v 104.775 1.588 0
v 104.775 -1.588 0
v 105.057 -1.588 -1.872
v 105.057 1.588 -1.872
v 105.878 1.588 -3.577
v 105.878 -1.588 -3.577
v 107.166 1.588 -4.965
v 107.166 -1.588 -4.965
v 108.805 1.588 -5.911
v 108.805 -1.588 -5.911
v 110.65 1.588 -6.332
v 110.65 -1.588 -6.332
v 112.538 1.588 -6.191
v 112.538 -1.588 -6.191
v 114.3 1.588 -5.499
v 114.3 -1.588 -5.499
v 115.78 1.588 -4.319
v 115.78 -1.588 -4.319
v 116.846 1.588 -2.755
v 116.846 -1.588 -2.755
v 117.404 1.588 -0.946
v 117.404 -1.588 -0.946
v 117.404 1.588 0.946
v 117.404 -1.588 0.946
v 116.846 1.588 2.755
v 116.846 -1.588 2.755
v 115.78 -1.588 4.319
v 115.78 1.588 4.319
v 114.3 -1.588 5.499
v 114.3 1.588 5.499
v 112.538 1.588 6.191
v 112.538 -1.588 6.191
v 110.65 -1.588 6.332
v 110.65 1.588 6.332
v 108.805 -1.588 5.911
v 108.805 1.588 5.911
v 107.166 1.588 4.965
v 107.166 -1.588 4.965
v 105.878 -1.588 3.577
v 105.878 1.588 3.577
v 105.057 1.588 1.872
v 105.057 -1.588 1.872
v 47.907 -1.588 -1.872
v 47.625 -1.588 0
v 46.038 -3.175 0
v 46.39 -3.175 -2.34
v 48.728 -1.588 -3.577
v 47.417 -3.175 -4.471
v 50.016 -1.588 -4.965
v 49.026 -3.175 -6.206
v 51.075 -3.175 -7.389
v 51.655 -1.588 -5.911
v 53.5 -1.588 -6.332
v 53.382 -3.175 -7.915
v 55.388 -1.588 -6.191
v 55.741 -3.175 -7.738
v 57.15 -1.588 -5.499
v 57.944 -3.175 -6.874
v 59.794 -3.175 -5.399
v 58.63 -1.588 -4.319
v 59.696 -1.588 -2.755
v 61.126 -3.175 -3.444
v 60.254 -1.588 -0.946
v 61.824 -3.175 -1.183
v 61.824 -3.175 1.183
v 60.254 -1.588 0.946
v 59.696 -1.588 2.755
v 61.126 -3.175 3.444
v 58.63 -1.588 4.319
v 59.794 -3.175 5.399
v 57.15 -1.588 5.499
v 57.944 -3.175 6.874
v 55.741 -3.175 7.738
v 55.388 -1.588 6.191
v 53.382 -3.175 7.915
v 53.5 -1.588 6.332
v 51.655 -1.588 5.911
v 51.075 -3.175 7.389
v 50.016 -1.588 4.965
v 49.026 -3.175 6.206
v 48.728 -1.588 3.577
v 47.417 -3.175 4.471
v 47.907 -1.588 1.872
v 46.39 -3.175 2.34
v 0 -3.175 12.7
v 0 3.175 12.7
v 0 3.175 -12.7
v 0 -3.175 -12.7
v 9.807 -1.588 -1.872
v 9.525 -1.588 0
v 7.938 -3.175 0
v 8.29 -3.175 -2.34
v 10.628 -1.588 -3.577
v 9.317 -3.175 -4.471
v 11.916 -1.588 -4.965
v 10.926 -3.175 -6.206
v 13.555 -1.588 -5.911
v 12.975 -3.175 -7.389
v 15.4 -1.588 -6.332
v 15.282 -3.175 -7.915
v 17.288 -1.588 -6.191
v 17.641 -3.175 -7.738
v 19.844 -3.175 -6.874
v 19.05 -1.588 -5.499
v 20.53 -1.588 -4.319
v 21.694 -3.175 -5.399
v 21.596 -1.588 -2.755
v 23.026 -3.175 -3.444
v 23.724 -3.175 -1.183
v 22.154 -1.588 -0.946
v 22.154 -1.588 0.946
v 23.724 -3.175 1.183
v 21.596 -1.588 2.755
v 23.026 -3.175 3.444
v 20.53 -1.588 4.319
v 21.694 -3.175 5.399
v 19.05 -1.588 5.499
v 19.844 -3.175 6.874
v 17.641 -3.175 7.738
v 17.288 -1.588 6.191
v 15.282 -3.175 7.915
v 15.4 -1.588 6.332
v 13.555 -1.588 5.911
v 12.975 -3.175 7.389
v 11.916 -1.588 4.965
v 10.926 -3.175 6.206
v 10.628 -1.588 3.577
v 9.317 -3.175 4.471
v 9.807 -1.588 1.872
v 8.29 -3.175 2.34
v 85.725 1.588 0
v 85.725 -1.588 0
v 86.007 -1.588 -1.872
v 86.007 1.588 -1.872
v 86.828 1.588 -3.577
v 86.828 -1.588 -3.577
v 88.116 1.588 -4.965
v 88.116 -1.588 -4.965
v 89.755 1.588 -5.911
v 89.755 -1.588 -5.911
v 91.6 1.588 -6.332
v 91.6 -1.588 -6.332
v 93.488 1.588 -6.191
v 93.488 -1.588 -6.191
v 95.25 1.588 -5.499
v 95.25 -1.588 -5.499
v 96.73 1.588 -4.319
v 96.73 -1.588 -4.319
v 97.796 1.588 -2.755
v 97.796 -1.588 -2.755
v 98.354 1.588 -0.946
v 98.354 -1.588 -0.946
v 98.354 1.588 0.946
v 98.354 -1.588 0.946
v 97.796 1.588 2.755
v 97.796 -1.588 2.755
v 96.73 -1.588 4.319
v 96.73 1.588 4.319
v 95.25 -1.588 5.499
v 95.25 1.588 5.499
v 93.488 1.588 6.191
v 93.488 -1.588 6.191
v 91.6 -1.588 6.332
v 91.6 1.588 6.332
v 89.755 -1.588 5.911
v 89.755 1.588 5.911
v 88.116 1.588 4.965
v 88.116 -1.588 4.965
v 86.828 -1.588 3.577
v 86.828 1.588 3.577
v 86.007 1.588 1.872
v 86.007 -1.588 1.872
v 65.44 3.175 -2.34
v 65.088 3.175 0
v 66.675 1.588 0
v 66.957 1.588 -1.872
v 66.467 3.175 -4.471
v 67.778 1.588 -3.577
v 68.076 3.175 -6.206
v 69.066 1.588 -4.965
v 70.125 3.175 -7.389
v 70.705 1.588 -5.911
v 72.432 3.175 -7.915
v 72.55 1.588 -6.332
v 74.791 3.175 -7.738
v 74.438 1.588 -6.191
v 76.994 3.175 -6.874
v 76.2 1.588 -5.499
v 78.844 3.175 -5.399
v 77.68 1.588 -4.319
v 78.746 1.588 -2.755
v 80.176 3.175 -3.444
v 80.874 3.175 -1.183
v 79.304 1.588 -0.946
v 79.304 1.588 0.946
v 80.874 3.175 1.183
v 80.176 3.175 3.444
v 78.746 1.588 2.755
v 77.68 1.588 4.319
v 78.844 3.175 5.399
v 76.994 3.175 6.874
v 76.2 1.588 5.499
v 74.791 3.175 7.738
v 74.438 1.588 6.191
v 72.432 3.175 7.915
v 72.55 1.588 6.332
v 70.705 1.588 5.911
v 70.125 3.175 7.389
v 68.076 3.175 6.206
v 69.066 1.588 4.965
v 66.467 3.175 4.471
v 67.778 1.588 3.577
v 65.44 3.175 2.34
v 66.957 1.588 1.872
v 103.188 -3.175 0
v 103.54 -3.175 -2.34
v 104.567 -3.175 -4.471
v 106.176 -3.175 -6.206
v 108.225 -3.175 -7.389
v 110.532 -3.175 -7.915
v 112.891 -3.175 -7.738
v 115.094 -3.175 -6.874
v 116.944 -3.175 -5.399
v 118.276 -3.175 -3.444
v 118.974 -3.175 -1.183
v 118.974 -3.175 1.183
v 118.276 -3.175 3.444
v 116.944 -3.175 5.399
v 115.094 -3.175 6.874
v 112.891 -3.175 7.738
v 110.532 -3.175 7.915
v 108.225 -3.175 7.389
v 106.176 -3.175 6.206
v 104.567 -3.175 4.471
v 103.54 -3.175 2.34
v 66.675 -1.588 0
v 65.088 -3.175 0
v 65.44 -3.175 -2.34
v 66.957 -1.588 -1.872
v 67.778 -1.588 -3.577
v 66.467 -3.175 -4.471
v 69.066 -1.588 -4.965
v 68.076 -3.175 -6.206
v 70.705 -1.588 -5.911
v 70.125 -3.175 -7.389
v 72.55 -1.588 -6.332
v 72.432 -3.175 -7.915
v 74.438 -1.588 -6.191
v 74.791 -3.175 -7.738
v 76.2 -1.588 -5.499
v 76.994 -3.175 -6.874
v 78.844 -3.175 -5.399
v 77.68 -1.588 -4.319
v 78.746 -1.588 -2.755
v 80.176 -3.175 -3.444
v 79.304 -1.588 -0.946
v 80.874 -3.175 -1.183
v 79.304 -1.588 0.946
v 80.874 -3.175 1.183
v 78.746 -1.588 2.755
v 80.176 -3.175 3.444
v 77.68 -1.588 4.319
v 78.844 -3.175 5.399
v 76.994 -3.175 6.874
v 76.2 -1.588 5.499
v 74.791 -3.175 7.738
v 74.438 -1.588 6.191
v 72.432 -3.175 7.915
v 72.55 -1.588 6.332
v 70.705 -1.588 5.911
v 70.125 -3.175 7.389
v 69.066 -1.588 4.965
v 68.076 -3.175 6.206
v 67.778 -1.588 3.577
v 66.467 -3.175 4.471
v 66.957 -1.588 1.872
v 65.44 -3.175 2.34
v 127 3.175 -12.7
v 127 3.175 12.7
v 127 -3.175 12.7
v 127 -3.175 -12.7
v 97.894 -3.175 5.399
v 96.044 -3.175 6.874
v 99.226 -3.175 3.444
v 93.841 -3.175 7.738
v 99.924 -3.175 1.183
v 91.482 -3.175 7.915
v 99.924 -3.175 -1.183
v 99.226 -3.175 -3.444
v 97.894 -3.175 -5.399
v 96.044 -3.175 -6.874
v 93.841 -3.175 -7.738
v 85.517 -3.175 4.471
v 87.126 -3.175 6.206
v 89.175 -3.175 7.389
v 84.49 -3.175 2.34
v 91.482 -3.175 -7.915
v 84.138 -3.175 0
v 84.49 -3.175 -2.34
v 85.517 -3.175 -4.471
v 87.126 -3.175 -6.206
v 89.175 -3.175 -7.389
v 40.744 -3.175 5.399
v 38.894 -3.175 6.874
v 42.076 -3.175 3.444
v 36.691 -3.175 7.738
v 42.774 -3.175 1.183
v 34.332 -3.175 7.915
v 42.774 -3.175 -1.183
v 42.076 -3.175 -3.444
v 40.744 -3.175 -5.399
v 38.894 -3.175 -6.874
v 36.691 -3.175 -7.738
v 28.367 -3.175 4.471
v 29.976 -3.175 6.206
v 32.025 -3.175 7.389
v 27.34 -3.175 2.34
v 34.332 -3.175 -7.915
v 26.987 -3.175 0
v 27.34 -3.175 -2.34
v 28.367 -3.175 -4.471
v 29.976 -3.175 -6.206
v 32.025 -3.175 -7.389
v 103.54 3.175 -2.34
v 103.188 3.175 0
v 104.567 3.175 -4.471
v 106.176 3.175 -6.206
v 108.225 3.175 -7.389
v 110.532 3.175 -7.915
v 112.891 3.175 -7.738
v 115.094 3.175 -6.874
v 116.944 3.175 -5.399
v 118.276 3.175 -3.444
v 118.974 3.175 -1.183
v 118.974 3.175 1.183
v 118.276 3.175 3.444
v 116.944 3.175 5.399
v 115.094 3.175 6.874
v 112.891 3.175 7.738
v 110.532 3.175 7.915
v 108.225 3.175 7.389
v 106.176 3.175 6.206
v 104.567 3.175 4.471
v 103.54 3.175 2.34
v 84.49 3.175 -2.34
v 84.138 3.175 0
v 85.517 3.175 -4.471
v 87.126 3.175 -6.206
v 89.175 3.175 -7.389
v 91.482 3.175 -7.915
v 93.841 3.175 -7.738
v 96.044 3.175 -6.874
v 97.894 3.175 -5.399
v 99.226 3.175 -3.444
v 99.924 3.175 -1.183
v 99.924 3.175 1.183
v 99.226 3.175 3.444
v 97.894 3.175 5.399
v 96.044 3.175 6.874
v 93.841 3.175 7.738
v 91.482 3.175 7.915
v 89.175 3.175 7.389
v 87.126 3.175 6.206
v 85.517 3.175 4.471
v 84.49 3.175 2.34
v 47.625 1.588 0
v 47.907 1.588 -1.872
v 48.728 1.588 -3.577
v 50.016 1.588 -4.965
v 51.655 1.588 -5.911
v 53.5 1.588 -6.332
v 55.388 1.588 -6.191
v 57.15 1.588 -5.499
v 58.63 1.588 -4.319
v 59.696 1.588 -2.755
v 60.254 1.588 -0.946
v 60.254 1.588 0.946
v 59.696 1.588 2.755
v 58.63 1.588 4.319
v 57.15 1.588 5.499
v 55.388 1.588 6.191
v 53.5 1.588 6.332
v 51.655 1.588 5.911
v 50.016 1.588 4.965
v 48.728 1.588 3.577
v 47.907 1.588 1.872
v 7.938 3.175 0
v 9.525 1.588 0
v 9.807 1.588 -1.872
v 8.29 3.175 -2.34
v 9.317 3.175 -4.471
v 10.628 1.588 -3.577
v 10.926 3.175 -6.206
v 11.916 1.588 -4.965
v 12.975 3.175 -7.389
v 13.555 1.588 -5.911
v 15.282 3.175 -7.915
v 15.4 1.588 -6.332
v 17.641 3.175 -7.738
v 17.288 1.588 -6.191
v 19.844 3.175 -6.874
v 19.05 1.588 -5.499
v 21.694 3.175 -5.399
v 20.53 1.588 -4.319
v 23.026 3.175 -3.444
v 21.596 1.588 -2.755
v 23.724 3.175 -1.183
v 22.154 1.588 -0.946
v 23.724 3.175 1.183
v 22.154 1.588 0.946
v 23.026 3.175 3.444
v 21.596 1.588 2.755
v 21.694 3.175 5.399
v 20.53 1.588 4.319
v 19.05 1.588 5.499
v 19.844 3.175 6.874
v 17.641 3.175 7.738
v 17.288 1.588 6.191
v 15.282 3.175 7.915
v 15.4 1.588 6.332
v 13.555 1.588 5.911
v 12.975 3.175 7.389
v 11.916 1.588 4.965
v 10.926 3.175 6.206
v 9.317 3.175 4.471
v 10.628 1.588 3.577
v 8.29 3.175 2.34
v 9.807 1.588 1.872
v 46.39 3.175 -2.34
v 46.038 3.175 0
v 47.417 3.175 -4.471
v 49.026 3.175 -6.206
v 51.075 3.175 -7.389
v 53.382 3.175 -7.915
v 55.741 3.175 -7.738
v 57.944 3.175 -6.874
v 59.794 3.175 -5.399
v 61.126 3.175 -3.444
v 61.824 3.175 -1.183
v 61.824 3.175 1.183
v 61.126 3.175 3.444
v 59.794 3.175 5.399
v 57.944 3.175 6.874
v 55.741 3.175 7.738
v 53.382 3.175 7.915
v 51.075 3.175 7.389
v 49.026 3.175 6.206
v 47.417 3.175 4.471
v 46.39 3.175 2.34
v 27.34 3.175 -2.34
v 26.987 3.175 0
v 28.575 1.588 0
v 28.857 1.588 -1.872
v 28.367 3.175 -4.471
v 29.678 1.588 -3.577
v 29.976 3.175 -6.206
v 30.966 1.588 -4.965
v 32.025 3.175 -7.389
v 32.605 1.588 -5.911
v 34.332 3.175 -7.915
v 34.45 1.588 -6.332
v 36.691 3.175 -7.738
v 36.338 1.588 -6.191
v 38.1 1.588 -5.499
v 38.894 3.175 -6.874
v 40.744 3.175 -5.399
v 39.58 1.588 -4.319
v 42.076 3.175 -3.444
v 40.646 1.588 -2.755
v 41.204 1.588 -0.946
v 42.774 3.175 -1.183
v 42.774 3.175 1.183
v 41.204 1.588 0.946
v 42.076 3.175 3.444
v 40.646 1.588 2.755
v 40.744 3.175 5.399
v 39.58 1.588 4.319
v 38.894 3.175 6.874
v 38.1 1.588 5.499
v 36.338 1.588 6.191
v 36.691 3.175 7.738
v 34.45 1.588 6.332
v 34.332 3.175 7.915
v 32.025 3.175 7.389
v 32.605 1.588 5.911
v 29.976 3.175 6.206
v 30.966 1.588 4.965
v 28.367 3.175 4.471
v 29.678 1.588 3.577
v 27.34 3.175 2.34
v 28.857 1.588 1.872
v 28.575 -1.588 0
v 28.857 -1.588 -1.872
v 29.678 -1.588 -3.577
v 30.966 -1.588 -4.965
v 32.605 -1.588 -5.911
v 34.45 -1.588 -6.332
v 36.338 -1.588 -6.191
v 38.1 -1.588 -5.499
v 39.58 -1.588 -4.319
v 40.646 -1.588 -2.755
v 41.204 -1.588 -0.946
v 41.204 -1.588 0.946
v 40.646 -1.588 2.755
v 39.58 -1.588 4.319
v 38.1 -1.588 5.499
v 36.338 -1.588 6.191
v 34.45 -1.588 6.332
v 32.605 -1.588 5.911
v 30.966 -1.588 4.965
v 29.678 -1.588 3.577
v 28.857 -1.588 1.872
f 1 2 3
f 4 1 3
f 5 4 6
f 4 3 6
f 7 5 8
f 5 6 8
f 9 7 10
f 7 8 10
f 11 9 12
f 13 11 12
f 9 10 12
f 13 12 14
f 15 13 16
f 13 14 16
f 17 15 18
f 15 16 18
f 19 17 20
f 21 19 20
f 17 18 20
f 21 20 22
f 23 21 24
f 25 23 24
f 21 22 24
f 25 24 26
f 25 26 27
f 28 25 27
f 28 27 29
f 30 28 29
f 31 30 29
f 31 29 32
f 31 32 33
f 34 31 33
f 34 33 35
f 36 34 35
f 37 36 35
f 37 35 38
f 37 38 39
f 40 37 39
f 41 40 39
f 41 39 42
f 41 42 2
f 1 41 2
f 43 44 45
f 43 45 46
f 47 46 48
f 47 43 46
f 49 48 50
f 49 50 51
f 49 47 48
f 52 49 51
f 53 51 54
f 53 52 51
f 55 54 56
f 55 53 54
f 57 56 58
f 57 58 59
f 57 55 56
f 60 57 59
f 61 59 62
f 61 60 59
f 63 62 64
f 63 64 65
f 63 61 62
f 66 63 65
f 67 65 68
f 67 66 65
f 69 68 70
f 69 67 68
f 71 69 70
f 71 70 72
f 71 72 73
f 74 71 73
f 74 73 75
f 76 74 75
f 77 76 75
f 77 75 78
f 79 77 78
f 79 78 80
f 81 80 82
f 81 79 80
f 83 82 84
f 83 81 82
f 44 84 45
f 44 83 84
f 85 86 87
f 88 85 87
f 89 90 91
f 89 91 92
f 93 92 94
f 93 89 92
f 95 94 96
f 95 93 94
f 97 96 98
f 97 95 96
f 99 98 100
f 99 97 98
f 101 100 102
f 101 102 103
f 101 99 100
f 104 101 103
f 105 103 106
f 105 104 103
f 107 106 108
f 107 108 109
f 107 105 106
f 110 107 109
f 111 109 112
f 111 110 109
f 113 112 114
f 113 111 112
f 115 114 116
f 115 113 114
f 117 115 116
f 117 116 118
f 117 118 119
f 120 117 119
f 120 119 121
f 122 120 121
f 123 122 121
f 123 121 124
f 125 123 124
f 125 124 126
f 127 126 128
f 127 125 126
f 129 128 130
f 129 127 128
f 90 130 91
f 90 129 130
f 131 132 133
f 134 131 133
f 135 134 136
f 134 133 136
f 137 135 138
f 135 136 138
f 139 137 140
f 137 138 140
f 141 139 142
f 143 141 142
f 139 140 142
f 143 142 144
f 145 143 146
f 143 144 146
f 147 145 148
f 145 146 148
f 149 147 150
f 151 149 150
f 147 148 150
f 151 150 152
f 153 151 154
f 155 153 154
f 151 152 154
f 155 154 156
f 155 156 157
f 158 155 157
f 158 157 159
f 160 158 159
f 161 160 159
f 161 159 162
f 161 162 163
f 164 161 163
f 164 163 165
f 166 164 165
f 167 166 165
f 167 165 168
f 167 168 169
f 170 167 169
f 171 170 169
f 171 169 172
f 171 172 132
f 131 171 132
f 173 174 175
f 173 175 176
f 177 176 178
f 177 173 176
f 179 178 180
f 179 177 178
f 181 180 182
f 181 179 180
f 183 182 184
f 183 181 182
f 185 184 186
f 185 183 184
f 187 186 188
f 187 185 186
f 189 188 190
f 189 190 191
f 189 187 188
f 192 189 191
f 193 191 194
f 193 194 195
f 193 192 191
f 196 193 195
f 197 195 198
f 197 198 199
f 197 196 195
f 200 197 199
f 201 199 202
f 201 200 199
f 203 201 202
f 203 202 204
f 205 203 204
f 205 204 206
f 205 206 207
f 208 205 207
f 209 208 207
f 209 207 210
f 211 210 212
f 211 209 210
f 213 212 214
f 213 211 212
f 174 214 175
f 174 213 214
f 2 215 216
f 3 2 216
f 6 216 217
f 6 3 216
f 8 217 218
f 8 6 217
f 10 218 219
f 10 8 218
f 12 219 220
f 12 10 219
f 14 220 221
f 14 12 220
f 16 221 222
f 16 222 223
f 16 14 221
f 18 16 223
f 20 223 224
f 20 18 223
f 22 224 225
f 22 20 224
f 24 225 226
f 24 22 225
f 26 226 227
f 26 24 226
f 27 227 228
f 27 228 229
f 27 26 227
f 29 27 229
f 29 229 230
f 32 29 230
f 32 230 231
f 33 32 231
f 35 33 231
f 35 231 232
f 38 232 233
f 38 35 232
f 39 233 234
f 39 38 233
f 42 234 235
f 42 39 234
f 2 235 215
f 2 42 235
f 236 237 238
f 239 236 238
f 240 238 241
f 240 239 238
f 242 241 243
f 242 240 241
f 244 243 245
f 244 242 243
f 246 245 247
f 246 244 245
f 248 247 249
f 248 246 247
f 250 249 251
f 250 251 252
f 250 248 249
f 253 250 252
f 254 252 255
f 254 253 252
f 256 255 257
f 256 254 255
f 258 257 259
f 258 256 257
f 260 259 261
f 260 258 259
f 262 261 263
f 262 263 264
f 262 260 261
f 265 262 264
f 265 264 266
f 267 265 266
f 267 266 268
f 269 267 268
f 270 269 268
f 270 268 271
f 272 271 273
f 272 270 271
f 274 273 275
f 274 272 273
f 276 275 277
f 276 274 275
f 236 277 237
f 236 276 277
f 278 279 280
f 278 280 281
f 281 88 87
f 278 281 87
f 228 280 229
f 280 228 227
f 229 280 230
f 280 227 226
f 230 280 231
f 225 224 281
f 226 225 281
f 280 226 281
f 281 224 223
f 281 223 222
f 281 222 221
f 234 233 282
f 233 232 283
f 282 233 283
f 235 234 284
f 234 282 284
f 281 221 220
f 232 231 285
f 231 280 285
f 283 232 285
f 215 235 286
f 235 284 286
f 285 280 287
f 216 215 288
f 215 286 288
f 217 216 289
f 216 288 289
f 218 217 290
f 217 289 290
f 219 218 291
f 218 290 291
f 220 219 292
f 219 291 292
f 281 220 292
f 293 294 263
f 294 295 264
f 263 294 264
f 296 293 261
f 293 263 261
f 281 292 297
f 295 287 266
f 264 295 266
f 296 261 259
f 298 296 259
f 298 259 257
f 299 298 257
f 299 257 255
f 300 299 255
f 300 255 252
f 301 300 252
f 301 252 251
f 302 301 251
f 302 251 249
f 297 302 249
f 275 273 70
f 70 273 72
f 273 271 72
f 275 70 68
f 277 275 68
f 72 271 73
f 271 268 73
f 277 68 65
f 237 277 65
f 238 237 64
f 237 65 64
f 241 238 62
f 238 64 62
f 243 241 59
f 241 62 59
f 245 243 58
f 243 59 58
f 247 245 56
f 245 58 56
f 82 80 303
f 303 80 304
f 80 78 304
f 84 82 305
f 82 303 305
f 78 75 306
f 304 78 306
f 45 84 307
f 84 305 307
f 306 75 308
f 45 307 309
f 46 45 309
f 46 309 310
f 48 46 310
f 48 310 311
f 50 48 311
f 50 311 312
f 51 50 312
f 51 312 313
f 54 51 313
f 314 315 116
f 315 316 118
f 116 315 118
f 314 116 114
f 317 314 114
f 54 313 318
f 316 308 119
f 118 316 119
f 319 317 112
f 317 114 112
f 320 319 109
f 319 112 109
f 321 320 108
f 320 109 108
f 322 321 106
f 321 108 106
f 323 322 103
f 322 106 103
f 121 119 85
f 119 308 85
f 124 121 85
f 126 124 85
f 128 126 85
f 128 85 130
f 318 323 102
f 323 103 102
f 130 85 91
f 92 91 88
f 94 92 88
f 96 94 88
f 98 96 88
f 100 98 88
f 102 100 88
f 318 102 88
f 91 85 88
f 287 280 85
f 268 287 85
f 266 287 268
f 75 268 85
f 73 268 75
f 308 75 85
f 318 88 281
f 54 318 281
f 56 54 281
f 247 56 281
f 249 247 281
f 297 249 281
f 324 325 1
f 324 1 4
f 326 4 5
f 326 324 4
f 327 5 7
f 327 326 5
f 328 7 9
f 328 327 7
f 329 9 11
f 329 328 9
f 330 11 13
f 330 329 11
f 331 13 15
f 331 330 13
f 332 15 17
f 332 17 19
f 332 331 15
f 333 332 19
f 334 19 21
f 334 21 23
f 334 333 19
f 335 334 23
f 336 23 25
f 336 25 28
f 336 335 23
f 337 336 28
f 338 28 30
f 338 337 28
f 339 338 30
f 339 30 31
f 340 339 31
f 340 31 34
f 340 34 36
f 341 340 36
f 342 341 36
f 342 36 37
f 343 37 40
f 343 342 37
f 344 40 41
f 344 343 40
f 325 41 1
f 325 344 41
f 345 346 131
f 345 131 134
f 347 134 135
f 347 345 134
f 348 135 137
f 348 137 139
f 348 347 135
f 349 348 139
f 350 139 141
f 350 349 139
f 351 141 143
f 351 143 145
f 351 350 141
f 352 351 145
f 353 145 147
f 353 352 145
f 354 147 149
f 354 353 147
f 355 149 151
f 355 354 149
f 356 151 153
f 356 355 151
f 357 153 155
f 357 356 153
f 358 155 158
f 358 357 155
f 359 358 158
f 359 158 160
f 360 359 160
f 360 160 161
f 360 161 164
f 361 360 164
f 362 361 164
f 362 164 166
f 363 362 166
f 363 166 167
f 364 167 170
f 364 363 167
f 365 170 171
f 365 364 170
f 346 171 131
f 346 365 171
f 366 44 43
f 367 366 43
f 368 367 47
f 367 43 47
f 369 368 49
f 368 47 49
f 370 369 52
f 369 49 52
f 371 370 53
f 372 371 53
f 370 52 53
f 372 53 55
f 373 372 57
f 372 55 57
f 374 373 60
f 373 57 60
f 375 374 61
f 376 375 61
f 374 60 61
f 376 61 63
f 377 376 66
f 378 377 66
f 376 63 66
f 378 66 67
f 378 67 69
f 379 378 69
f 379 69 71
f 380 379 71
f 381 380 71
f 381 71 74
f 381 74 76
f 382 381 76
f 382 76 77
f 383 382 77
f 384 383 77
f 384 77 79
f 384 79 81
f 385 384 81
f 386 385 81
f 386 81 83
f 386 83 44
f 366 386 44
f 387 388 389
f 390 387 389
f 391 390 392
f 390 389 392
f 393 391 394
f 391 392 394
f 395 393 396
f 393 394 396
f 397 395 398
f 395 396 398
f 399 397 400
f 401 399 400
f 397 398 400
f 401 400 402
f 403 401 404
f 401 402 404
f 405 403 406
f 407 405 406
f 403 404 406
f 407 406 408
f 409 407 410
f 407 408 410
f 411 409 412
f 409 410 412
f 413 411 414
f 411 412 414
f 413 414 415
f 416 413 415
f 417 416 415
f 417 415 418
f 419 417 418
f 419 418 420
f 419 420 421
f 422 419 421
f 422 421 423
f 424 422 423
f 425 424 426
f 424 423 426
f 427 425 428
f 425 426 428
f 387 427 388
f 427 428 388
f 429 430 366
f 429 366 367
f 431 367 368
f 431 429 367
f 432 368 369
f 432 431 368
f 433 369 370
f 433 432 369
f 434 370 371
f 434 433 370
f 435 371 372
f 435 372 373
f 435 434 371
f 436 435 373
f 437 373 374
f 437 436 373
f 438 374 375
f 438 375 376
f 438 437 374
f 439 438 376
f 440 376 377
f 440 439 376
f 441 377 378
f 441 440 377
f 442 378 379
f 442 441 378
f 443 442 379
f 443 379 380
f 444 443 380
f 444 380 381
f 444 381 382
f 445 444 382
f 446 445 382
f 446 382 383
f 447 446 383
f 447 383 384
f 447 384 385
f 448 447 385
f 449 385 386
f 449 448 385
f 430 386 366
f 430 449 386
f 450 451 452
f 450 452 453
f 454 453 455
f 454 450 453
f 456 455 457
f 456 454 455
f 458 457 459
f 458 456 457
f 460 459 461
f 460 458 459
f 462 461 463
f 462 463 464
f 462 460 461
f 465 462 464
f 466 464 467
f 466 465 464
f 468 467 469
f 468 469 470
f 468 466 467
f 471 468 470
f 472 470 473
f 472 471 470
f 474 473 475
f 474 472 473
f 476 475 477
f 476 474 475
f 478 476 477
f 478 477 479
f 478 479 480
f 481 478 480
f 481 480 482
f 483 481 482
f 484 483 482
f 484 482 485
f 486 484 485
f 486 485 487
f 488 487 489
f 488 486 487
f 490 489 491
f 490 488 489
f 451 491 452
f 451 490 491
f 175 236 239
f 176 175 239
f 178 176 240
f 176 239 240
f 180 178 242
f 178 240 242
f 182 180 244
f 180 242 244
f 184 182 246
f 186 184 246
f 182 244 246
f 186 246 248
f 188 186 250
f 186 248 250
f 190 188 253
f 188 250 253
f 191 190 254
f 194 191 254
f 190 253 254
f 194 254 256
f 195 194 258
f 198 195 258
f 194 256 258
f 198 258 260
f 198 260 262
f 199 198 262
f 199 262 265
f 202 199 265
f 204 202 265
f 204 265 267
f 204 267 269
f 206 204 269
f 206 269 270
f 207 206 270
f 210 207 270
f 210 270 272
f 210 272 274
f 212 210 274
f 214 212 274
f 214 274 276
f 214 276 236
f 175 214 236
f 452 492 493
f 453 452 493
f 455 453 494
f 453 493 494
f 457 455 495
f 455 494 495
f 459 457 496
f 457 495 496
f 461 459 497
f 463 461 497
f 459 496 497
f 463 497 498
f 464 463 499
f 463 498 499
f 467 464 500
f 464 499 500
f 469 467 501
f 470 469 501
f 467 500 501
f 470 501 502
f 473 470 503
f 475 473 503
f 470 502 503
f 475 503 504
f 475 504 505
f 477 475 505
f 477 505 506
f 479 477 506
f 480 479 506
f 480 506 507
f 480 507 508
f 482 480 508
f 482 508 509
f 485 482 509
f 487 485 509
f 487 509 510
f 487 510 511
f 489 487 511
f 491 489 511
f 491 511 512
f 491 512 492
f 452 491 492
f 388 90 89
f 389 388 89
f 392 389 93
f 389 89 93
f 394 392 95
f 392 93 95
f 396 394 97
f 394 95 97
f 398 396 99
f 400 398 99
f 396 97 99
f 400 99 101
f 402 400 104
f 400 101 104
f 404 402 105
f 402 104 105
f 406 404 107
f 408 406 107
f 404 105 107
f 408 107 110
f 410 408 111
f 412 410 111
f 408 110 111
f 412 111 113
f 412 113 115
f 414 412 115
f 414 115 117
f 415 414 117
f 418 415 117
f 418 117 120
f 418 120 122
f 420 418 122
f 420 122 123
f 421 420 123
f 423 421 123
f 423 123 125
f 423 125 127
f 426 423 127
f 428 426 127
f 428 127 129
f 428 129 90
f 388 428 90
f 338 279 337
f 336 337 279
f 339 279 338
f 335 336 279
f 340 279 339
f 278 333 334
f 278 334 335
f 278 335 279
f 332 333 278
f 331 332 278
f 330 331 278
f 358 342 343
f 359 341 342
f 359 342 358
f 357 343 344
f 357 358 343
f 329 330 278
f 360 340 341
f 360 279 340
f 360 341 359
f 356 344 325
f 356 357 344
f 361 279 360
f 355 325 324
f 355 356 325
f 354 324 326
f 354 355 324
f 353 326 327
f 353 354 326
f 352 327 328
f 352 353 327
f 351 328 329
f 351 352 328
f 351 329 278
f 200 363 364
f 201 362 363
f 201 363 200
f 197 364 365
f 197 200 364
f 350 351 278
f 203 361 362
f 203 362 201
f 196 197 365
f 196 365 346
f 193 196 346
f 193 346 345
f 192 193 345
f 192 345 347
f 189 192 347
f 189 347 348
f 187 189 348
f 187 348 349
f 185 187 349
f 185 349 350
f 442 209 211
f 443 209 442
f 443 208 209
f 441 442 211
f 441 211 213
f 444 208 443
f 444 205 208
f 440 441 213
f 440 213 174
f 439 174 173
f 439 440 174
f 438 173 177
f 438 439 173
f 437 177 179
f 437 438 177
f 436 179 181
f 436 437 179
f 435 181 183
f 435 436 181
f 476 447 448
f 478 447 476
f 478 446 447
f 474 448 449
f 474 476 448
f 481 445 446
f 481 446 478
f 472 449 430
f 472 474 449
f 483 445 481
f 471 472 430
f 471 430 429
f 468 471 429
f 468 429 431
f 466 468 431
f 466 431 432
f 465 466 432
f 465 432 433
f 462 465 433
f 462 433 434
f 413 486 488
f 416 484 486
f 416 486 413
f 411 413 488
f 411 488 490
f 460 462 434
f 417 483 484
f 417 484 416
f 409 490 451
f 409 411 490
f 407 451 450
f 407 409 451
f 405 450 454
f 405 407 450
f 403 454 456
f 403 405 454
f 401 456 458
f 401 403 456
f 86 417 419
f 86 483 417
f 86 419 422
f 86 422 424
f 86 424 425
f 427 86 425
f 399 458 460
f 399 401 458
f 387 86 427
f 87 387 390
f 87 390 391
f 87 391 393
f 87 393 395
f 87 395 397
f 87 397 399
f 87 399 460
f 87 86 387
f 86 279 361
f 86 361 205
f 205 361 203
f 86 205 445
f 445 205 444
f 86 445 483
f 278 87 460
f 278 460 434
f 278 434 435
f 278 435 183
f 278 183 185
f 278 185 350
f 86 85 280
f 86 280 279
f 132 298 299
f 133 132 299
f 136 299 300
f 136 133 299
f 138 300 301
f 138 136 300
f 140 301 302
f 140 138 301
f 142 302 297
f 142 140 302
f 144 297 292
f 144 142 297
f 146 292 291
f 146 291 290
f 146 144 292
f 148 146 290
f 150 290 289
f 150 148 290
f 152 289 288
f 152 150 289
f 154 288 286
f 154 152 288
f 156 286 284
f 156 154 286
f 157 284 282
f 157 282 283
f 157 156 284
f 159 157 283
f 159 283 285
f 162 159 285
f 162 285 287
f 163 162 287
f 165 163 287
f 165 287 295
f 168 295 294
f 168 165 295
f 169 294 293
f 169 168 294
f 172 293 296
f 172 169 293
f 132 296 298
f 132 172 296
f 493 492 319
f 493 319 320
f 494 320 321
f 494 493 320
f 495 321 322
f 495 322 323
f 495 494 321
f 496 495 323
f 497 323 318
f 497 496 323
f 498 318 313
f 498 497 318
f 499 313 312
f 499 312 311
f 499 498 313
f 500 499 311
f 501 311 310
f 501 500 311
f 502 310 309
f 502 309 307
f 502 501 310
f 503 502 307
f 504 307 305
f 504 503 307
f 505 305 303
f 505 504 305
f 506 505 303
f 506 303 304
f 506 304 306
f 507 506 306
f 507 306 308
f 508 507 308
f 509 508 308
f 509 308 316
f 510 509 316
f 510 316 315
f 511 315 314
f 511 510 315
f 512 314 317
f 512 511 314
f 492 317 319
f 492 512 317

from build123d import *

# Parameters (mm, degrees)
CROQUIS2_W                = 25.4
CROQUIS2_H                = 6.35
SALIENTE_EXTRUIR1_DEPTH   = 127
TALADRO1_D                = 12.7
CHAFL_N1_SIZE             = 1.5875
MATRIZL1_COUNT            = 6
MATRIZL1_PITCH            = 19.05
CHAFL_N1_OF_MATRIZL1_SIZE = 1.5875


with BuildPart() as part:
    # Croquis2 → Saliente-Extruir1 (new body)
    with BuildSketch(Plane(origin=(0, 0, 0), x_dir=(0, 0, -1), z_dir=(1, 0, 0))):
        Rectangle(CROQUIS2_W, CROQUIS2_H)
    extrude(amount=SALIENTE_EXTRUIR1_DEPTH)

    # Taladro1 (through all)
    with Locations(Plane(origin=(0, 3.175, 0), x_dir=(1, 0, 0), z_dir=(0, 1, 0))):
        with Locations((15.875, 0)):
            taladro1 = Hole(TALADRO1_D / 2)

    # Chaflán1
    chafl_n1_edges = [part.edges().sort_by_distance(p)[0] for p in [
        (22.225, 3.175, 0),
        (22.225, -3.175, 0),
    ]]
    chamfer(chafl_n1_edges, length=CHAFL_N1_SIZE)

    # MatrizL1: Taladro1 ×6
    with Locations(*[(i * MATRIZL1_PITCH, 0, 0) for i in range(1, MATRIZL1_COUNT)]):
        add(taladro1, mode=Mode.SUBTRACT)

    # Chaflán1 of MatrizL1
    chafl_n1_of_matrizl1_edges = [part.edges().sort_by_distance(p)[0] for p in [
        (41.275, 3.175, 0),
        (41.275, -3.175, 0),
        (60.325, 3.175, 0),
        (60.325, -3.175, 0),
        (79.375, 3.175, 0),
        (79.375, -3.175, 0),
        (98.425, 3.175, 0),
        (98.425, -3.175, 0),
        (117.475, 3.175, 0),
        (117.475, -3.175, 0),
    ]]
    chamfer(chafl_n1_of_matrizl1_edges, length=CHAFL_N1_OF_MATRIZL1_SIZE)


solid = part.part
